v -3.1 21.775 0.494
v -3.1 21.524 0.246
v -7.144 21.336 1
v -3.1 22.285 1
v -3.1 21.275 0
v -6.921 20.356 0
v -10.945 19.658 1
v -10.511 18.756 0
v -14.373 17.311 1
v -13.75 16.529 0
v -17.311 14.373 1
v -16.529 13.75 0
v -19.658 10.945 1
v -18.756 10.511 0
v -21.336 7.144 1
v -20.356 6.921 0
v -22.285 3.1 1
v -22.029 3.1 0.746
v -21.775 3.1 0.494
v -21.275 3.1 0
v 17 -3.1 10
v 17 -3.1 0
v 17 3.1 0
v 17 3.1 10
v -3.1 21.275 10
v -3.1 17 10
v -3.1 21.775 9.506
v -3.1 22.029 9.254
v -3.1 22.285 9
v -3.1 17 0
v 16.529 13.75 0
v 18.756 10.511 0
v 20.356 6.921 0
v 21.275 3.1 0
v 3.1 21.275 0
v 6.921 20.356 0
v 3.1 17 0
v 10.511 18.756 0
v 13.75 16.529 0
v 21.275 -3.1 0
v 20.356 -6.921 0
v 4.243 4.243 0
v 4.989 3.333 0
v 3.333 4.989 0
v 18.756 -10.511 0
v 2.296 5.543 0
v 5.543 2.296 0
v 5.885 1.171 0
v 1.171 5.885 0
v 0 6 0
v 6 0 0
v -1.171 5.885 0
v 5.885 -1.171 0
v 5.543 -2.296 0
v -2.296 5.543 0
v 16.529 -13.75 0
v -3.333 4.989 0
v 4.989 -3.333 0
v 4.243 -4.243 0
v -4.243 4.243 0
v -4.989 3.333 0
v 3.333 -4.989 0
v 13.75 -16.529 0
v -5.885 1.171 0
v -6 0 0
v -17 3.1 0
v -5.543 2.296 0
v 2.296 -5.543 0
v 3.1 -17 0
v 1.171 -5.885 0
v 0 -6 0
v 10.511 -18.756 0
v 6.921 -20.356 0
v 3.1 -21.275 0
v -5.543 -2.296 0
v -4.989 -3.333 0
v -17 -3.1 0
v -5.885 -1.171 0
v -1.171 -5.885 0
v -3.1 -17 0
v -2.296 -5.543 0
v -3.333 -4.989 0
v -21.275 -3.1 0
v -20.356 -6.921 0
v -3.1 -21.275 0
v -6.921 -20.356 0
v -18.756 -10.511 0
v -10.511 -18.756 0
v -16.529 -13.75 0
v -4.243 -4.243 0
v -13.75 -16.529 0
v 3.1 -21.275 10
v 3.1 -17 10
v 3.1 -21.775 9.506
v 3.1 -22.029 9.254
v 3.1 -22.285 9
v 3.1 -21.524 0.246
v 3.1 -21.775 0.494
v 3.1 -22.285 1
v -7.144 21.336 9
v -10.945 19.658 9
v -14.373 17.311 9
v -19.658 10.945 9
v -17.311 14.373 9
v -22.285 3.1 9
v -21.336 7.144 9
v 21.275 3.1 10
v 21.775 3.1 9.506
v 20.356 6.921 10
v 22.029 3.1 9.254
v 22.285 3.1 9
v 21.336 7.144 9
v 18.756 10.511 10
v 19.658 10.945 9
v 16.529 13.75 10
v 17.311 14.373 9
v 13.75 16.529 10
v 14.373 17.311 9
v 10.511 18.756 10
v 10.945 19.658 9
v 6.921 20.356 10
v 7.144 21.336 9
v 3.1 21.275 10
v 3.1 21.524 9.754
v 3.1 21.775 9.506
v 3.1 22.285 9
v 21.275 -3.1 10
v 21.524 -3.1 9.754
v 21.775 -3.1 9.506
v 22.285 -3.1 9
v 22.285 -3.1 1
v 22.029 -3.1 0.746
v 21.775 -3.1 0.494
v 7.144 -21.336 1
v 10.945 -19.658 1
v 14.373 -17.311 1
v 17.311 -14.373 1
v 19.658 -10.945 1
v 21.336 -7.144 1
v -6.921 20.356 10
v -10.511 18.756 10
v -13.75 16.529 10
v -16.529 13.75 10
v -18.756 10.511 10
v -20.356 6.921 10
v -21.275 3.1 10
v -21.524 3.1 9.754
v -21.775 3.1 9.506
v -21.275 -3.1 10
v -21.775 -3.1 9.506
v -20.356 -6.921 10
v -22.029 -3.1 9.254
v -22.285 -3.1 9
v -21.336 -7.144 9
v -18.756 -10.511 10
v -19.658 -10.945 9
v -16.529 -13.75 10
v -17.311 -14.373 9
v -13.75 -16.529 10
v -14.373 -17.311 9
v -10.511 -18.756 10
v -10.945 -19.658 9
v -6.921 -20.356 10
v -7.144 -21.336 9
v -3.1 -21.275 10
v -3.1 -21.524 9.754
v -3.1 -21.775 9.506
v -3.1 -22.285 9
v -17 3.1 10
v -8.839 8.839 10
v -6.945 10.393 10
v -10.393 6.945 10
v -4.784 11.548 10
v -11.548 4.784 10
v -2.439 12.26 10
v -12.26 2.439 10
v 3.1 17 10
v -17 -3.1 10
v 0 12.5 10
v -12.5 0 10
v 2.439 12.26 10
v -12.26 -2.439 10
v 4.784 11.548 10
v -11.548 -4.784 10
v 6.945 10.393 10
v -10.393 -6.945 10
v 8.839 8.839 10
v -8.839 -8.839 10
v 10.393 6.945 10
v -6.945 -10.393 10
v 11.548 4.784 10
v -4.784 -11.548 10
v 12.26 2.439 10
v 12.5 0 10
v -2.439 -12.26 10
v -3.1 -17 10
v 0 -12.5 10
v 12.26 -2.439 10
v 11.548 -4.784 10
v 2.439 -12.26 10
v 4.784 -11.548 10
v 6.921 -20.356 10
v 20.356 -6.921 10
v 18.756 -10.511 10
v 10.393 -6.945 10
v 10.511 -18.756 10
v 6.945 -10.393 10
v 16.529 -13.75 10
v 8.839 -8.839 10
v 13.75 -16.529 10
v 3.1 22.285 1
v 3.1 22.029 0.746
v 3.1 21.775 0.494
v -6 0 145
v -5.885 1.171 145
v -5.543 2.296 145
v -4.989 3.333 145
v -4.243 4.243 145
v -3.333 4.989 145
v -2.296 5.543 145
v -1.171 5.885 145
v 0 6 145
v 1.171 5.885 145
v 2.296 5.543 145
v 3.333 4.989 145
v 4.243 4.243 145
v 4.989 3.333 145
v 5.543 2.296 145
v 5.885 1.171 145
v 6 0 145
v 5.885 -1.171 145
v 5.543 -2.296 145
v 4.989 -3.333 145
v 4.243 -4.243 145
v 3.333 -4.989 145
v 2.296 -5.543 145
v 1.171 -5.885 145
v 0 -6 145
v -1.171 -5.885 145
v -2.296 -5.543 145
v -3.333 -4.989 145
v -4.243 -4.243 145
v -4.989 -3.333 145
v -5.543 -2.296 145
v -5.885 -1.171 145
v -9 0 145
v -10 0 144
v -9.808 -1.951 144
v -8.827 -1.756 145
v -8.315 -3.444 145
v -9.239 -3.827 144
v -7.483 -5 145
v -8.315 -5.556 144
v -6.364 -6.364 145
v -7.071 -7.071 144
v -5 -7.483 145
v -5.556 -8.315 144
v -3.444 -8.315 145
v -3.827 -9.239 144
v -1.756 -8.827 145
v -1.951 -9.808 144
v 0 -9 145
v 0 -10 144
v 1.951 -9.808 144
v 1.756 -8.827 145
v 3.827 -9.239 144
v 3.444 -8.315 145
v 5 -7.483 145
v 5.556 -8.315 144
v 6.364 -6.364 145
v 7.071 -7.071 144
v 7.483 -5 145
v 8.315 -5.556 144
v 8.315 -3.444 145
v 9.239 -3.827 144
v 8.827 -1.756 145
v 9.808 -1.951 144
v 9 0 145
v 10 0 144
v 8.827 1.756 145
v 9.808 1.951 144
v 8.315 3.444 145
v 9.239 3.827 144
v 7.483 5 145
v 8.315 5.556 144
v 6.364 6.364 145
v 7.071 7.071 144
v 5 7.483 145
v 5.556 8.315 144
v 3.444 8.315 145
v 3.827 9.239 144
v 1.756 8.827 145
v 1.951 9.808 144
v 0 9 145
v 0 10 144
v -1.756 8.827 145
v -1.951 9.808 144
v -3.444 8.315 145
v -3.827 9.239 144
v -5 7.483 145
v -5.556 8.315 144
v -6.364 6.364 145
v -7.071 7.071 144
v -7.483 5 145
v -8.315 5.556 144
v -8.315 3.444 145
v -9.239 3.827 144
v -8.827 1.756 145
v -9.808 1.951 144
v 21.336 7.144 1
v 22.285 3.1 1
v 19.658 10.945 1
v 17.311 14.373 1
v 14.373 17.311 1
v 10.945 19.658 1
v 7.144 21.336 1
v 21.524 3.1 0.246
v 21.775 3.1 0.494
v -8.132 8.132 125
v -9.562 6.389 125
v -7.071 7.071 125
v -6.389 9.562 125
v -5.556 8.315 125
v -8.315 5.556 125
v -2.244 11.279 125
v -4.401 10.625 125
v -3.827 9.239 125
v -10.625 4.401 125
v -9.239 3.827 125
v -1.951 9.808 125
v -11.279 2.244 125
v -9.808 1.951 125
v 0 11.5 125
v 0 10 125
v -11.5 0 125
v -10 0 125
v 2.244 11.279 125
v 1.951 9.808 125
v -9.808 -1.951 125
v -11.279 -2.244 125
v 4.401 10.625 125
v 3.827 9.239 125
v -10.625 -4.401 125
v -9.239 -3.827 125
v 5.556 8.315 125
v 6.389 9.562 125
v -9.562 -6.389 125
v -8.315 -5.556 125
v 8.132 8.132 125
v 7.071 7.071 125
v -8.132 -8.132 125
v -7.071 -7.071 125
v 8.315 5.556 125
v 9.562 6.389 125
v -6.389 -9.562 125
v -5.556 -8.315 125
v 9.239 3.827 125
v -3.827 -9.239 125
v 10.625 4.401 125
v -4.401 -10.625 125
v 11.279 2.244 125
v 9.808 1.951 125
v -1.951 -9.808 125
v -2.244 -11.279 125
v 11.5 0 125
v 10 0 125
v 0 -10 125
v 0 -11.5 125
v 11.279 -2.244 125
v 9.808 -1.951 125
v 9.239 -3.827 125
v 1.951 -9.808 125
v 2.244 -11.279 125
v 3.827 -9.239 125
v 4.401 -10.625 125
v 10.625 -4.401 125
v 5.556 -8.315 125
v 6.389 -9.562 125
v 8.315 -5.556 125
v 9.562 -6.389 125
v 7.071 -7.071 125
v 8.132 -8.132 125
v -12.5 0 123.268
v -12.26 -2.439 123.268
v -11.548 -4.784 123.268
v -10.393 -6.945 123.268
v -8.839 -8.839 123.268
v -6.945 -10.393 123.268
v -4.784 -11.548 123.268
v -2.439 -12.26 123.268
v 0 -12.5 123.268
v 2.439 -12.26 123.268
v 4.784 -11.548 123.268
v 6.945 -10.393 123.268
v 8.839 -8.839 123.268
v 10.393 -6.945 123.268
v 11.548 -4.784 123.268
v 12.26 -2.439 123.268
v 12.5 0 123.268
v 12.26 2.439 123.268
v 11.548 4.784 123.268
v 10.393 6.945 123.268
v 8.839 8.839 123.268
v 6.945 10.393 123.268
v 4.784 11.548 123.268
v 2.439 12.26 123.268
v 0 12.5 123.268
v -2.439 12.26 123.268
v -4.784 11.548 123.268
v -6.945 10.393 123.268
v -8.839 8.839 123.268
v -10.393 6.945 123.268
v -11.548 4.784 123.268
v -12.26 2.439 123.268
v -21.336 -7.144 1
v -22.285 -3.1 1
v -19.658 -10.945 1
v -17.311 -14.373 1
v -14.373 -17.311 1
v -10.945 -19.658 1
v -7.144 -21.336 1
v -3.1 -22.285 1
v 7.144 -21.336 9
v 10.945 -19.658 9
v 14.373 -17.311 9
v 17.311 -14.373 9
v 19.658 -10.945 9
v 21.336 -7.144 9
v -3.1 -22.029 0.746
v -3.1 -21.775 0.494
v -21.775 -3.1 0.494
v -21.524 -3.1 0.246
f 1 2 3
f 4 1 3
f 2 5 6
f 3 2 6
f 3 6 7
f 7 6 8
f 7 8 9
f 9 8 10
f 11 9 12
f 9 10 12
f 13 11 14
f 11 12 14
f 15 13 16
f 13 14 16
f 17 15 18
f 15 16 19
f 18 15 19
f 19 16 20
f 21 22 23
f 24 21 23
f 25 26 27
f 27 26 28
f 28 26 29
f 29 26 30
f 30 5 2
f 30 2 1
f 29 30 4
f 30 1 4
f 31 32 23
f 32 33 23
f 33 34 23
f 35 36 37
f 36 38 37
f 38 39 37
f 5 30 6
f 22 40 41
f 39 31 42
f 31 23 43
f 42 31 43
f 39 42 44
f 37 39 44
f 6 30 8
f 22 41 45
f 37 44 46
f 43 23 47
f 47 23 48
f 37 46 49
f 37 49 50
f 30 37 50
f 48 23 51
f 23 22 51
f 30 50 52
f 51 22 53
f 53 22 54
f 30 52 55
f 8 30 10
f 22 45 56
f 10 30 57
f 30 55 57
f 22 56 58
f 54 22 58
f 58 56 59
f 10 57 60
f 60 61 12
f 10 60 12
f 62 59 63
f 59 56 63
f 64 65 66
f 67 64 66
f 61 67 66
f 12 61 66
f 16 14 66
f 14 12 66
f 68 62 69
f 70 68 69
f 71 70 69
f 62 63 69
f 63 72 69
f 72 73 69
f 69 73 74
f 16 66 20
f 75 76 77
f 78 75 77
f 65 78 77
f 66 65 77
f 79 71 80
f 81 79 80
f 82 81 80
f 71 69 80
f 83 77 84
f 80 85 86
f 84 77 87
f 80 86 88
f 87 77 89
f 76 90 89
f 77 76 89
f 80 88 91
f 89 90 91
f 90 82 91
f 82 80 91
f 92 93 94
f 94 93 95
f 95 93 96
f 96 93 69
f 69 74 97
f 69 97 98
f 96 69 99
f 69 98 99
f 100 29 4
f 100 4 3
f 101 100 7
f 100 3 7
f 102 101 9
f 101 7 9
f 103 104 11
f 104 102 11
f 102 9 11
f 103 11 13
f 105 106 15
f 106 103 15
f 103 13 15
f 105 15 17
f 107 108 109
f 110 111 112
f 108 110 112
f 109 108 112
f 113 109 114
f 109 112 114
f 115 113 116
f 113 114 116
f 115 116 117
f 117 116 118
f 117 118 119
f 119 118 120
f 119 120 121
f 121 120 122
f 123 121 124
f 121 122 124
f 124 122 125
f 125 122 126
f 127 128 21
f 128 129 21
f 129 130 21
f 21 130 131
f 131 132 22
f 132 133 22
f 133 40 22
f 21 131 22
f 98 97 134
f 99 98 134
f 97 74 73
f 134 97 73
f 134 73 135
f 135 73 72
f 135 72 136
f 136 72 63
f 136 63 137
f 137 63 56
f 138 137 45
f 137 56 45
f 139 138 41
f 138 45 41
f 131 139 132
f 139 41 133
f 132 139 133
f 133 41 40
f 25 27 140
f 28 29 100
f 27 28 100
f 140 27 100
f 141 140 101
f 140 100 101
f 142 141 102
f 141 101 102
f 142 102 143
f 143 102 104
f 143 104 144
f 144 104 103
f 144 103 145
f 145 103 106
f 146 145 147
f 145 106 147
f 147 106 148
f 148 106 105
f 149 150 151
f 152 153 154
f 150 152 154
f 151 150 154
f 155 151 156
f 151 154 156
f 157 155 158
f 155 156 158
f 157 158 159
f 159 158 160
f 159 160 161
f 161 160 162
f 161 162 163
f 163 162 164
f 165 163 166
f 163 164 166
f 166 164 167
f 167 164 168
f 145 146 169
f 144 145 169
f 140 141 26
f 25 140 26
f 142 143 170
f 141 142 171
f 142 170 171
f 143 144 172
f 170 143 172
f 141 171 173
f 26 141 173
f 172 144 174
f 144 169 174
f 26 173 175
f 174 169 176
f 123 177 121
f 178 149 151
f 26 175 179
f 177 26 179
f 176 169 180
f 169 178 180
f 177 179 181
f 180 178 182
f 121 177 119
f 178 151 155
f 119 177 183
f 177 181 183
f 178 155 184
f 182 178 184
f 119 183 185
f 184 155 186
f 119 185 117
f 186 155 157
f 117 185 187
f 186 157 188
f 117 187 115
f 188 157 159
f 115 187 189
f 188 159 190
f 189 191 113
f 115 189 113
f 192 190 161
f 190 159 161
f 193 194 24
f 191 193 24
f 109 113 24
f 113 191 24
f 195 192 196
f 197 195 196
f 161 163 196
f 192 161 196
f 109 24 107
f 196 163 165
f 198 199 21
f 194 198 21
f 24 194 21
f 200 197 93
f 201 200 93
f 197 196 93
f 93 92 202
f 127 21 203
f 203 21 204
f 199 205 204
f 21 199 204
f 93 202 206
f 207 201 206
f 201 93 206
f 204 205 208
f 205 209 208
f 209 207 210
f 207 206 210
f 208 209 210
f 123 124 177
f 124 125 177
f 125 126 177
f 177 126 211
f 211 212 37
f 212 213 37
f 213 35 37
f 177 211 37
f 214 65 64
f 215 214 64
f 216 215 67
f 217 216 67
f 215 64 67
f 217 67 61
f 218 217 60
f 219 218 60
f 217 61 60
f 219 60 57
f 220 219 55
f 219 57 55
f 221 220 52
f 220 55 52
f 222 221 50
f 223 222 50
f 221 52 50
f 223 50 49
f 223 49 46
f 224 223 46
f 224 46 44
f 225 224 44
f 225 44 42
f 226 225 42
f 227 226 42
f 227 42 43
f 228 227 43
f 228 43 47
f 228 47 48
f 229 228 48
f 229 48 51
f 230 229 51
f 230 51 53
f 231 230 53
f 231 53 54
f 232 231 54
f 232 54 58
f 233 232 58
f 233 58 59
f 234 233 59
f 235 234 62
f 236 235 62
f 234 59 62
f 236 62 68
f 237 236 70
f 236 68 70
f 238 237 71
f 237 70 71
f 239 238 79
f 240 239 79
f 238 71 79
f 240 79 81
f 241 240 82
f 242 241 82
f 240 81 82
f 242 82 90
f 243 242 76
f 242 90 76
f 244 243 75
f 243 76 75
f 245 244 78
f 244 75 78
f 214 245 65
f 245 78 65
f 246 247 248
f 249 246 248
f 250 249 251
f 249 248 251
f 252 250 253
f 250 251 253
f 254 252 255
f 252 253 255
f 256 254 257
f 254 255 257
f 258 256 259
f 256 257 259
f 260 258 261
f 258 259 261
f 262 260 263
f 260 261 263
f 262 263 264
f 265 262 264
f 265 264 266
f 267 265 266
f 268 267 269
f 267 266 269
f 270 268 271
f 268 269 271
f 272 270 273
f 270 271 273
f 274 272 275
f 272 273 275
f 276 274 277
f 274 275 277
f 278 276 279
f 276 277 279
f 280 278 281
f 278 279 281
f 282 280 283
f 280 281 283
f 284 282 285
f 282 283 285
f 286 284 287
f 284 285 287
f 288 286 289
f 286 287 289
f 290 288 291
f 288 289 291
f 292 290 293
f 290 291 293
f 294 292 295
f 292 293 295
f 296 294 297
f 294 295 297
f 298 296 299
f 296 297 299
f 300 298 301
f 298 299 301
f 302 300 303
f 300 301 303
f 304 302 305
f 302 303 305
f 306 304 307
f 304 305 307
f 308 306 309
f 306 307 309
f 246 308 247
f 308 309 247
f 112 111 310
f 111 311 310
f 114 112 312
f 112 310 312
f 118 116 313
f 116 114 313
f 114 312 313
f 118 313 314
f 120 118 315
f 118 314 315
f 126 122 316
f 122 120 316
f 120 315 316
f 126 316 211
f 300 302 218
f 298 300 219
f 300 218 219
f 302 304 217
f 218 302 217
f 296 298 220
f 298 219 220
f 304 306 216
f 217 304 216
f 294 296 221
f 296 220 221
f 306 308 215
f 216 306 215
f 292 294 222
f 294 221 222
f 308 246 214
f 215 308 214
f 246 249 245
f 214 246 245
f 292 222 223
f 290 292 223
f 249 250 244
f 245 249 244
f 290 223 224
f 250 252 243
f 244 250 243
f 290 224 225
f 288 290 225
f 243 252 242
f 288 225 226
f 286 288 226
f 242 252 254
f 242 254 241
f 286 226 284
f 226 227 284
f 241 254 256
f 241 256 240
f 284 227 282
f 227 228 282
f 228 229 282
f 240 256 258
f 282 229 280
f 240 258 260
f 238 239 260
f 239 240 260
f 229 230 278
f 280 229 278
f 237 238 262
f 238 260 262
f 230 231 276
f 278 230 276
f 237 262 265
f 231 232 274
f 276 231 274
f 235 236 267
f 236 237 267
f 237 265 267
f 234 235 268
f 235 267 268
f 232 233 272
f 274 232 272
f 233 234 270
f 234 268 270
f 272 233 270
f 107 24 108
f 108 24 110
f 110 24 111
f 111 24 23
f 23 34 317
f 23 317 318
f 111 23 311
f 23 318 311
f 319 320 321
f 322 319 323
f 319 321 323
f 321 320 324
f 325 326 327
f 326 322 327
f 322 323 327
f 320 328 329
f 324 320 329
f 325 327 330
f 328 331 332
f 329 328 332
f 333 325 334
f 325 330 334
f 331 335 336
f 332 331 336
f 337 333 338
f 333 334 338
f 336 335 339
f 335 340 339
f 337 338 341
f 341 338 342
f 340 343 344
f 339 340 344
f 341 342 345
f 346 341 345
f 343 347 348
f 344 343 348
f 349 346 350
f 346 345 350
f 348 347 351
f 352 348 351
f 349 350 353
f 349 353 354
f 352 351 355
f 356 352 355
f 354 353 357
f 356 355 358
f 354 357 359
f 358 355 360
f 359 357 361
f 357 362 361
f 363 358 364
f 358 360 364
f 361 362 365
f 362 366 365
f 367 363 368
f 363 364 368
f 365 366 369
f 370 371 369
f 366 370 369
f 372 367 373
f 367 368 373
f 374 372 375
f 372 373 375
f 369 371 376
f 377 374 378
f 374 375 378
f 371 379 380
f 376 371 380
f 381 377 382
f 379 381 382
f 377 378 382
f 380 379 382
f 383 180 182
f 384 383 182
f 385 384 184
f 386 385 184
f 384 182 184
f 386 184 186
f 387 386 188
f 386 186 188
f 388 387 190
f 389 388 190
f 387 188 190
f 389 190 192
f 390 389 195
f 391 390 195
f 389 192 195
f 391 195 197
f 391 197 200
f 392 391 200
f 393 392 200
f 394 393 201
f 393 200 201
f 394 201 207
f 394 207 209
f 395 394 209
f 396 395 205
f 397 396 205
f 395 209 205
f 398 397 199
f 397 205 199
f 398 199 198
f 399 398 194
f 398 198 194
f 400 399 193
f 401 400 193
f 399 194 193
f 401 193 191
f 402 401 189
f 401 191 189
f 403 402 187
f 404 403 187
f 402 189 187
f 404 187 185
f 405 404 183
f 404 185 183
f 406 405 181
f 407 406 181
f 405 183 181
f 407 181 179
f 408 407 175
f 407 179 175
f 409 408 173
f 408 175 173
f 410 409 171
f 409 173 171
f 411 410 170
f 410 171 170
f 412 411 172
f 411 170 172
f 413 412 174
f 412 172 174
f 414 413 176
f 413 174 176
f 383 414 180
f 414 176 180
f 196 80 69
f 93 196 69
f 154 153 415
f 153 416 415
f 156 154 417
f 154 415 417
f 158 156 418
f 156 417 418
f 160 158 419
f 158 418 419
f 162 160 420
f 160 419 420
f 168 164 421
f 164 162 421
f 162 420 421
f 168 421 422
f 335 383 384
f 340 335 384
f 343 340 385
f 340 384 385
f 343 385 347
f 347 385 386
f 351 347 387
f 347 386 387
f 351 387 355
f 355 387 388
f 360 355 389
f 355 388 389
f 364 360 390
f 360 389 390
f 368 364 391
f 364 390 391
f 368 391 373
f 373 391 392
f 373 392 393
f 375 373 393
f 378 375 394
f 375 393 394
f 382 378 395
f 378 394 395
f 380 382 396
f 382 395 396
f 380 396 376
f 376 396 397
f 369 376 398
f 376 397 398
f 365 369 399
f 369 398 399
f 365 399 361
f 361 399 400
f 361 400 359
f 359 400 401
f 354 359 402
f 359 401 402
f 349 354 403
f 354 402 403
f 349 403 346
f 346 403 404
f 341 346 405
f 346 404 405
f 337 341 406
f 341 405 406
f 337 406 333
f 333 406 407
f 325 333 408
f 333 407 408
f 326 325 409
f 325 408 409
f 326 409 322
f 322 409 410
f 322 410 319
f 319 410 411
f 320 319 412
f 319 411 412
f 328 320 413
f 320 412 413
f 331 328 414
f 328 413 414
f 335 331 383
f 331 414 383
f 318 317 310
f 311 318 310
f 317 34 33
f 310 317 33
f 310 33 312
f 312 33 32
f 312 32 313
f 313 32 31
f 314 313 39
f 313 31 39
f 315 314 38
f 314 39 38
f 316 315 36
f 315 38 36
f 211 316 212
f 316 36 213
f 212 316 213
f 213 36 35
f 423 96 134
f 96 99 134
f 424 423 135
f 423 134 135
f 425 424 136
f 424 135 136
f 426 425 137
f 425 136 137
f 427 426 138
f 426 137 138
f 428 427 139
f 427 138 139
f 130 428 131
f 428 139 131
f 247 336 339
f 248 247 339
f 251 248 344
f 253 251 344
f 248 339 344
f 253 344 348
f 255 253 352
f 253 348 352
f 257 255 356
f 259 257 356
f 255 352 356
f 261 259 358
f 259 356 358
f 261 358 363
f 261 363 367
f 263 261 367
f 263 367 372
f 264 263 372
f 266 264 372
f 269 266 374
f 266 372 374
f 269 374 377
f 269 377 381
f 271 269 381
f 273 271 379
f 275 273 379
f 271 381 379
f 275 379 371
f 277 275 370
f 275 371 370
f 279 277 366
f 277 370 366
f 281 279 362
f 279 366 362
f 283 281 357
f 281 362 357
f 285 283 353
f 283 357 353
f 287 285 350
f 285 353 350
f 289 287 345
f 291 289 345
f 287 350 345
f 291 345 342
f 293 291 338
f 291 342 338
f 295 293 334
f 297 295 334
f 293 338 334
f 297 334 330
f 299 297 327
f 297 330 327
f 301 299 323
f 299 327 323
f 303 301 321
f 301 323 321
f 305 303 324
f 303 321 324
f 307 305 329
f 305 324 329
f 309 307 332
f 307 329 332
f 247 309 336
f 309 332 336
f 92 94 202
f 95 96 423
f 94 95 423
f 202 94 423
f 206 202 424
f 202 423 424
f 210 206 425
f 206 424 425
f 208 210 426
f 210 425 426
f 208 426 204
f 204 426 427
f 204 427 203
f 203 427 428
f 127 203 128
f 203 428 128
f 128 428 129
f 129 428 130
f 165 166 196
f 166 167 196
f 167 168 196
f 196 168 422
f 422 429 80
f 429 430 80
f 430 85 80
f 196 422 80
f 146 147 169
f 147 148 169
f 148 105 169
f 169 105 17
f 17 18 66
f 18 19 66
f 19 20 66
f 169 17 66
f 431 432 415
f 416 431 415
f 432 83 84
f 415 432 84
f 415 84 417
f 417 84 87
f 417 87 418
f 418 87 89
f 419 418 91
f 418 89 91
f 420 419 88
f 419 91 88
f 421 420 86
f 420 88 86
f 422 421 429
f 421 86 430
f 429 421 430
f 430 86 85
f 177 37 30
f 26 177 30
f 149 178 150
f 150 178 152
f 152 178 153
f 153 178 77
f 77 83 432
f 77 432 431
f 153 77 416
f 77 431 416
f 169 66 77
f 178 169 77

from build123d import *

# Parameters (mm, degrees)
CHANFREIN1_SIZE              = 1
ESQUISSE3_R                  = 6
ENL_V_MAT_EXTRU_2_DEPTH      = 146
ENL_V_MAT_EXTRU_1_DEPTH      = 146
R_P_TITION_CIRCULAIRE1_COUNT = 4
CHANFREIN2_SIZE              = 1
CHANFREIN2_SIZE2             = 1.732050808


with BuildPart() as part:
    # Esquisse1 → Révolution1 (revolve)
    with BuildSketch(Plane(origin=(0, 0, 0), x_dir=(0, 0, -1), z_dir=(1, 0, 0)), mode=Mode.PRIVATE) as r_volution1_sk:
        Polygon((-145, 0), (-145, 10), (-125, 10), (-125, 12.5), (-10, 12.5), (-10, 22.5), (0, 22.5), (0, 0), align=None)
    revolve(r_volution1_sk.sketch.rotate(Axis((0, 0, 0), (0, 0, 1)), 90), axis=Axis((0, 0, 0), (0, 0, 1)))  # turned: the seam where the file's is

    # Chanfrein1
    chanfrein1_edges = [part.edges().sort_by_distance(p)[0] for p in [
        (22.5, 0, 0),
        (22.5, 0, 10),
        (10, 0, 145),
    ]]
    chamfer(chanfrein1_edges, length=CHANFREIN1_SIZE)

    # Esquisse3 → Enlèv. mat.-Extru.2 (cut, through all)
    with BuildSketch(Plane(origin=(0, 0, 0), x_dir=(-1, 0, 0), z_dir=(0, 0, -1))):
        Circle(ESQUISSE3_R)
    extrude(amount=-ENL_V_MAT_EXTRU_2_DEPTH, mode=Mode.SUBTRACT)

    # Esquisse2 → Enlèv. mat.-Extru.1 (cut, through all)
    with BuildSketch(Plane(origin=(0, 0, 0), x_dir=(-1, 0, 0), z_dir=(0, 0, -1))):
        with BuildLine():
            Line((-3.1, 22.285421243), (-3.1, 17))
            Line((-3.1, 17), (3.1, 17))
            Line((3.1, 17), (3.1, 22.285421243))
            ThreePointArc((3.1, 22.285421243), (0, 22.5), (-3.1, 22.285421243))
        make_face()
    enl_v_mat_extru_1 = extrude(amount=-ENL_V_MAT_EXTRU_1_DEPTH, mode=Mode.SUBTRACT)

    # Répétition circulaire1: Enlèv. mat.-Extru.1 ×4 about axis
    r_p_tition_circulaire1_axis = Axis((0, 0, 0), (0, 0, 1))
    for i in range(1, R_P_TITION_CIRCULAIRE1_COUNT):
        add(enl_v_mat_extru_1.rotate(r_p_tition_circulaire1_axis, i * 360 / R_P_TITION_CIRCULAIRE1_COUNT), mode=Mode.SUBTRACT)

    # Chanfrein2
    chanfrein2_edges = [part.edges().sort_by_distance(p)[0] for p in [
        (12.5, 0, 125),
    ]]
    chanfrein2_side = [part.faces().sort_by_distance(p)[0] for p in [
        (10.353553391, 0, 125),
    ]]
    chamfer(chanfrein2_edges, length=CHANFREIN2_SIZE, length2=CHANFREIN2_SIZE2, reference=chanfrein2_side[0])


solid = part.part
